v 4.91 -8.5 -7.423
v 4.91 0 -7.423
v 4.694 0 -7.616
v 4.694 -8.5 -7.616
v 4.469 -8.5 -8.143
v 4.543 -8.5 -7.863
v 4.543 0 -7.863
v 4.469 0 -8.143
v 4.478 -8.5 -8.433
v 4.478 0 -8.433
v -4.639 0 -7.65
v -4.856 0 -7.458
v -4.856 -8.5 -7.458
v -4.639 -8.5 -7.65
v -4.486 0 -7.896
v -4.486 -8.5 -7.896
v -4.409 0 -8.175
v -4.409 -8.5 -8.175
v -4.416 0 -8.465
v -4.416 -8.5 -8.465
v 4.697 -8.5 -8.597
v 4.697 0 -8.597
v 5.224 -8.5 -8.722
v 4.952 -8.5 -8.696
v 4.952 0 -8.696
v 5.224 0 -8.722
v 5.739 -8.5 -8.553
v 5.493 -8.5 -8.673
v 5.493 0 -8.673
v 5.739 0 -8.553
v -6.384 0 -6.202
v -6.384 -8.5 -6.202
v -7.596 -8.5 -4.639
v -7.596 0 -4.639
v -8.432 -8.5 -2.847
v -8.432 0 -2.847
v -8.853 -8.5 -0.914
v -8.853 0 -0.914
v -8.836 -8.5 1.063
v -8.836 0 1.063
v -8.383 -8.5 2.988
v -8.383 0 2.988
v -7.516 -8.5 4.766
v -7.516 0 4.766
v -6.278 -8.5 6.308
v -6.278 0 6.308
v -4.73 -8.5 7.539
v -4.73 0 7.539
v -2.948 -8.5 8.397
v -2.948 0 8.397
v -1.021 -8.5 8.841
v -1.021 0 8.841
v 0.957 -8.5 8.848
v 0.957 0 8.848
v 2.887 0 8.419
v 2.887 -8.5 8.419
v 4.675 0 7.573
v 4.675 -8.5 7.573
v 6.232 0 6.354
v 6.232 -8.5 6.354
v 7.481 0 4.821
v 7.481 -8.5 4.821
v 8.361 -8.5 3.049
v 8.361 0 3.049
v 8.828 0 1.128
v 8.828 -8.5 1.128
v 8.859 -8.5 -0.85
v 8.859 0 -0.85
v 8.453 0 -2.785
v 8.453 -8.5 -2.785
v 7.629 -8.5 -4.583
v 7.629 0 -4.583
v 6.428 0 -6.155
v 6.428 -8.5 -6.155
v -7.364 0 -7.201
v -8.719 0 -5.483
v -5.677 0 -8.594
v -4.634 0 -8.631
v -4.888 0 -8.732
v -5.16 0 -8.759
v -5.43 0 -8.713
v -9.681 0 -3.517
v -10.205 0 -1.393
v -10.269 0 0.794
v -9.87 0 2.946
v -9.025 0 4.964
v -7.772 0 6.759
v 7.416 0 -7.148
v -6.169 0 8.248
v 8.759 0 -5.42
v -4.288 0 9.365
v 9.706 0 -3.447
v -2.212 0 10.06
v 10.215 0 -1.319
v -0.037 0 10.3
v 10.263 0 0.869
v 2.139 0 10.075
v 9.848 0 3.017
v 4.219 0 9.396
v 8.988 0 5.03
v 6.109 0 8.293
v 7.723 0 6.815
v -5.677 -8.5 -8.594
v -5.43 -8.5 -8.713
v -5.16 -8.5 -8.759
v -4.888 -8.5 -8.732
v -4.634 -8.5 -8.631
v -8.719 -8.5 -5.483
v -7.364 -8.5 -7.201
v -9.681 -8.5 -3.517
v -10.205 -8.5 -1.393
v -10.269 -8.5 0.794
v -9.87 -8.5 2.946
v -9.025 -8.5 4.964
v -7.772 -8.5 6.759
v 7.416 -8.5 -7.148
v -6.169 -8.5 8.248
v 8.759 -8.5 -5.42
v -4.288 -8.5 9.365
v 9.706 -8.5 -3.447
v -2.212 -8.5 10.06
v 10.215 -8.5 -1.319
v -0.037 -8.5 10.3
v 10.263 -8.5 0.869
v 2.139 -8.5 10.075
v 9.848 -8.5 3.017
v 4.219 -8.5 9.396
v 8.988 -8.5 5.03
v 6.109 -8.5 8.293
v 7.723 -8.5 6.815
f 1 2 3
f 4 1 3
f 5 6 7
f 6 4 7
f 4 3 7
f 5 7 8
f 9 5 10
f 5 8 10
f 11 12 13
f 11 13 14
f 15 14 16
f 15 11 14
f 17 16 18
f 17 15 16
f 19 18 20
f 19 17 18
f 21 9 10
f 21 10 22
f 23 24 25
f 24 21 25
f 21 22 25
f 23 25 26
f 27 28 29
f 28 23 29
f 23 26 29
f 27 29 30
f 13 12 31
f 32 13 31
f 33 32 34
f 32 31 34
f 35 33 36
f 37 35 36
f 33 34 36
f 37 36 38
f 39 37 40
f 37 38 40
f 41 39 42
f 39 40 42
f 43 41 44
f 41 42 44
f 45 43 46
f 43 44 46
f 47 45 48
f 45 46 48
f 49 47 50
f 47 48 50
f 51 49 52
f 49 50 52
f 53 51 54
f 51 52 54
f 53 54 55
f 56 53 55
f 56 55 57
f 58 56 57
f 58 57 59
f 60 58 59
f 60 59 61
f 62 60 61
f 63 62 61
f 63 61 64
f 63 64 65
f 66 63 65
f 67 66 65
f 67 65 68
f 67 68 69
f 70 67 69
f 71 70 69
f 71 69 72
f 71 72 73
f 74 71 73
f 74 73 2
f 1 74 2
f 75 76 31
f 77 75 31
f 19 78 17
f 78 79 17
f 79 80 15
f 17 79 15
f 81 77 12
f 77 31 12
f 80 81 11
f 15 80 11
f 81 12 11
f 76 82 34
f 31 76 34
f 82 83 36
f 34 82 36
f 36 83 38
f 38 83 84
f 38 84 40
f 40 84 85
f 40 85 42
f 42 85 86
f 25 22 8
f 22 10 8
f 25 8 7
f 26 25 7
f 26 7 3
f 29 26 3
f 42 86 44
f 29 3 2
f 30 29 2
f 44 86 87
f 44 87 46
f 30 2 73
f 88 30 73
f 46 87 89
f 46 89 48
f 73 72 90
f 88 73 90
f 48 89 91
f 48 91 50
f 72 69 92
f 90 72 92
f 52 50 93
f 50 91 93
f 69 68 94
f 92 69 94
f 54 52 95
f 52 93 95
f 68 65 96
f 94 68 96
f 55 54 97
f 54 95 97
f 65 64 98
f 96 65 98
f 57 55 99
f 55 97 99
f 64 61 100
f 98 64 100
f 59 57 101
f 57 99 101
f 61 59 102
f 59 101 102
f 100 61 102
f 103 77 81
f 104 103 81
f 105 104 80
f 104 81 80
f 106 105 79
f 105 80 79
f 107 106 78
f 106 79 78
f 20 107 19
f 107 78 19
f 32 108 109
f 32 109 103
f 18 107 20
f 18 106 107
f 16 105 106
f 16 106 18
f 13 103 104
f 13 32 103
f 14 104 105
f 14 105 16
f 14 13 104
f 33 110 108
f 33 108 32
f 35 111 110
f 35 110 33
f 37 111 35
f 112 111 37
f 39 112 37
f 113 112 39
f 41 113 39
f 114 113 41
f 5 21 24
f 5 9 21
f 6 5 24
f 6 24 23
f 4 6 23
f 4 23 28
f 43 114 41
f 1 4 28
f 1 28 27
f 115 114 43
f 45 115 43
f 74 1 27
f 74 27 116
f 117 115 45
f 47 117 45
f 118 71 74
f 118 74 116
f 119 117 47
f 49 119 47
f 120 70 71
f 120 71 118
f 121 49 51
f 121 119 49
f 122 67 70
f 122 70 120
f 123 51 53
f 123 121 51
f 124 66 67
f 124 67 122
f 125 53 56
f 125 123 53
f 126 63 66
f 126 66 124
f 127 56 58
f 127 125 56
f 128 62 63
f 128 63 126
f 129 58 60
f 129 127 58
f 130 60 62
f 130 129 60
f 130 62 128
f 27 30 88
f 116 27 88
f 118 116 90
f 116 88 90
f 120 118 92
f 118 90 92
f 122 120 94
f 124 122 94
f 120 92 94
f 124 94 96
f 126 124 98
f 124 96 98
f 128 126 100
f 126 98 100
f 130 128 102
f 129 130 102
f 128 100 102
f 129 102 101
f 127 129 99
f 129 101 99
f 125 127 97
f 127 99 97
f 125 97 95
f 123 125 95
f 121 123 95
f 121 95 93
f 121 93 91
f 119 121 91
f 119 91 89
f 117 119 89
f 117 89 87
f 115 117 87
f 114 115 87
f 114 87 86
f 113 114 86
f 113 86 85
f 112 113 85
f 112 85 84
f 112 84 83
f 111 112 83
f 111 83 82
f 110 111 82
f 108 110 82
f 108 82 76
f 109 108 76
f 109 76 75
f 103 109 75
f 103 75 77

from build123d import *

# Parameters (mm, degrees)
F1_DEPTH    = 8.5
F2_T1_DEPTH = 13.246827309
F2_T3_DEPTH = 14.0456784574


# Not quite as in the source:
# - a fillet or chamfer that OpenCascade refuses, or shapes differently, is made with other operations: its cross-section is extruded or revolved along the edge and cut away or added


with BuildPart() as f1:
    # F0 (on Front) → F1 (new body)
    with BuildSketch(Plane.XZ):
        with BuildLine():
            ThreePointArc((-4.0781486701, -7.910670226), (-0.0323602773, 8.899941169), (4.1355666361, -7.880805073))
            Line((4.1355666361, -7.880805073), (4.7861052081, -9.1204822755))
            ThreePointArc((4.7861052081, -9.1204822755), (-0.037450658, 10.2999319147), (-4.7196552025, -9.1550453177))
            Line((-4.7196552025, -9.1550453177), (-4.0781486701, -7.910670226))
        make_face()
    extrude(amount=F1_DEPTH)

    # F2: fillet of radius 1 on 4 edges, made by hand

    # F2_s2 → F2_t1 (cut)
    with BuildSketch(Plane.XZ.offset(-2.3734136545)):
        with BuildLine():
            ThreePointArc((-4.8563481702, -7.4582761044), (-4.4353117021, -8.0403480428), (-4.5131659168, -8.7545036072))
            Line((-4.5131659168, -8.7545036072), (-4.0781486701, -7.910670226))
            ThreePointArc((-4.0781486701, -7.910670226), (-4.4729714461, -7.6943178023), (-4.8563481702, -7.4582761044))
        make_face()
        with BuildLine():
            ThreePointArc((4.9104557842, -7.4227639051), (4.4936632318, -8.0078821984), (4.5767086731, -8.72145273))
            Line((4.5767086731, -8.72145273), (4.1355666361, -7.880805073))
            ThreePointArc((4.1355666361, -7.880805073), (4.5288056742, -7.6615872484), (4.9104557842, -7.4227639051))
        make_face()
    extrude(amount=F2_T1_DEPTH, mode=Mode.SUBTRACT)

    # F2_s4 → F2_t3 (cut)
    with BuildSketch(Plane.XZ.offset(-2.7728392287)):
        with BuildLine():
            ThreePointArc((4.2963798875, -8.1872534993), (4.9361379588, -8.6919225089), (5.7390532384, -8.5529683693))
            ThreePointArc((5.7390532384, -8.5529683693), (5.2702237229, -8.849561679), (4.7861052081, -9.1204822755))
            Line((4.7861052081, -9.1204822755), (4.2963798875, -8.1872534993))
        make_face()
        with BuildLine():
            ThreePointArc((-5.6767049543, -8.5944761831), (-4.8728004404, -8.7275879094), (-4.2367291997, -8.2182799714))
            Line((-4.2367291997, -8.2182799714), (-4.7196552025, -9.1550453177))
            ThreePointArc((-4.7196552025, -9.1550453177), (-5.2057310309, -8.8876523579), (-5.6767049543, -8.5944761831))
        make_face()
    extrude(amount=F2_T3_DEPTH, mode=Mode.SUBTRACT)


solid = f1.part
